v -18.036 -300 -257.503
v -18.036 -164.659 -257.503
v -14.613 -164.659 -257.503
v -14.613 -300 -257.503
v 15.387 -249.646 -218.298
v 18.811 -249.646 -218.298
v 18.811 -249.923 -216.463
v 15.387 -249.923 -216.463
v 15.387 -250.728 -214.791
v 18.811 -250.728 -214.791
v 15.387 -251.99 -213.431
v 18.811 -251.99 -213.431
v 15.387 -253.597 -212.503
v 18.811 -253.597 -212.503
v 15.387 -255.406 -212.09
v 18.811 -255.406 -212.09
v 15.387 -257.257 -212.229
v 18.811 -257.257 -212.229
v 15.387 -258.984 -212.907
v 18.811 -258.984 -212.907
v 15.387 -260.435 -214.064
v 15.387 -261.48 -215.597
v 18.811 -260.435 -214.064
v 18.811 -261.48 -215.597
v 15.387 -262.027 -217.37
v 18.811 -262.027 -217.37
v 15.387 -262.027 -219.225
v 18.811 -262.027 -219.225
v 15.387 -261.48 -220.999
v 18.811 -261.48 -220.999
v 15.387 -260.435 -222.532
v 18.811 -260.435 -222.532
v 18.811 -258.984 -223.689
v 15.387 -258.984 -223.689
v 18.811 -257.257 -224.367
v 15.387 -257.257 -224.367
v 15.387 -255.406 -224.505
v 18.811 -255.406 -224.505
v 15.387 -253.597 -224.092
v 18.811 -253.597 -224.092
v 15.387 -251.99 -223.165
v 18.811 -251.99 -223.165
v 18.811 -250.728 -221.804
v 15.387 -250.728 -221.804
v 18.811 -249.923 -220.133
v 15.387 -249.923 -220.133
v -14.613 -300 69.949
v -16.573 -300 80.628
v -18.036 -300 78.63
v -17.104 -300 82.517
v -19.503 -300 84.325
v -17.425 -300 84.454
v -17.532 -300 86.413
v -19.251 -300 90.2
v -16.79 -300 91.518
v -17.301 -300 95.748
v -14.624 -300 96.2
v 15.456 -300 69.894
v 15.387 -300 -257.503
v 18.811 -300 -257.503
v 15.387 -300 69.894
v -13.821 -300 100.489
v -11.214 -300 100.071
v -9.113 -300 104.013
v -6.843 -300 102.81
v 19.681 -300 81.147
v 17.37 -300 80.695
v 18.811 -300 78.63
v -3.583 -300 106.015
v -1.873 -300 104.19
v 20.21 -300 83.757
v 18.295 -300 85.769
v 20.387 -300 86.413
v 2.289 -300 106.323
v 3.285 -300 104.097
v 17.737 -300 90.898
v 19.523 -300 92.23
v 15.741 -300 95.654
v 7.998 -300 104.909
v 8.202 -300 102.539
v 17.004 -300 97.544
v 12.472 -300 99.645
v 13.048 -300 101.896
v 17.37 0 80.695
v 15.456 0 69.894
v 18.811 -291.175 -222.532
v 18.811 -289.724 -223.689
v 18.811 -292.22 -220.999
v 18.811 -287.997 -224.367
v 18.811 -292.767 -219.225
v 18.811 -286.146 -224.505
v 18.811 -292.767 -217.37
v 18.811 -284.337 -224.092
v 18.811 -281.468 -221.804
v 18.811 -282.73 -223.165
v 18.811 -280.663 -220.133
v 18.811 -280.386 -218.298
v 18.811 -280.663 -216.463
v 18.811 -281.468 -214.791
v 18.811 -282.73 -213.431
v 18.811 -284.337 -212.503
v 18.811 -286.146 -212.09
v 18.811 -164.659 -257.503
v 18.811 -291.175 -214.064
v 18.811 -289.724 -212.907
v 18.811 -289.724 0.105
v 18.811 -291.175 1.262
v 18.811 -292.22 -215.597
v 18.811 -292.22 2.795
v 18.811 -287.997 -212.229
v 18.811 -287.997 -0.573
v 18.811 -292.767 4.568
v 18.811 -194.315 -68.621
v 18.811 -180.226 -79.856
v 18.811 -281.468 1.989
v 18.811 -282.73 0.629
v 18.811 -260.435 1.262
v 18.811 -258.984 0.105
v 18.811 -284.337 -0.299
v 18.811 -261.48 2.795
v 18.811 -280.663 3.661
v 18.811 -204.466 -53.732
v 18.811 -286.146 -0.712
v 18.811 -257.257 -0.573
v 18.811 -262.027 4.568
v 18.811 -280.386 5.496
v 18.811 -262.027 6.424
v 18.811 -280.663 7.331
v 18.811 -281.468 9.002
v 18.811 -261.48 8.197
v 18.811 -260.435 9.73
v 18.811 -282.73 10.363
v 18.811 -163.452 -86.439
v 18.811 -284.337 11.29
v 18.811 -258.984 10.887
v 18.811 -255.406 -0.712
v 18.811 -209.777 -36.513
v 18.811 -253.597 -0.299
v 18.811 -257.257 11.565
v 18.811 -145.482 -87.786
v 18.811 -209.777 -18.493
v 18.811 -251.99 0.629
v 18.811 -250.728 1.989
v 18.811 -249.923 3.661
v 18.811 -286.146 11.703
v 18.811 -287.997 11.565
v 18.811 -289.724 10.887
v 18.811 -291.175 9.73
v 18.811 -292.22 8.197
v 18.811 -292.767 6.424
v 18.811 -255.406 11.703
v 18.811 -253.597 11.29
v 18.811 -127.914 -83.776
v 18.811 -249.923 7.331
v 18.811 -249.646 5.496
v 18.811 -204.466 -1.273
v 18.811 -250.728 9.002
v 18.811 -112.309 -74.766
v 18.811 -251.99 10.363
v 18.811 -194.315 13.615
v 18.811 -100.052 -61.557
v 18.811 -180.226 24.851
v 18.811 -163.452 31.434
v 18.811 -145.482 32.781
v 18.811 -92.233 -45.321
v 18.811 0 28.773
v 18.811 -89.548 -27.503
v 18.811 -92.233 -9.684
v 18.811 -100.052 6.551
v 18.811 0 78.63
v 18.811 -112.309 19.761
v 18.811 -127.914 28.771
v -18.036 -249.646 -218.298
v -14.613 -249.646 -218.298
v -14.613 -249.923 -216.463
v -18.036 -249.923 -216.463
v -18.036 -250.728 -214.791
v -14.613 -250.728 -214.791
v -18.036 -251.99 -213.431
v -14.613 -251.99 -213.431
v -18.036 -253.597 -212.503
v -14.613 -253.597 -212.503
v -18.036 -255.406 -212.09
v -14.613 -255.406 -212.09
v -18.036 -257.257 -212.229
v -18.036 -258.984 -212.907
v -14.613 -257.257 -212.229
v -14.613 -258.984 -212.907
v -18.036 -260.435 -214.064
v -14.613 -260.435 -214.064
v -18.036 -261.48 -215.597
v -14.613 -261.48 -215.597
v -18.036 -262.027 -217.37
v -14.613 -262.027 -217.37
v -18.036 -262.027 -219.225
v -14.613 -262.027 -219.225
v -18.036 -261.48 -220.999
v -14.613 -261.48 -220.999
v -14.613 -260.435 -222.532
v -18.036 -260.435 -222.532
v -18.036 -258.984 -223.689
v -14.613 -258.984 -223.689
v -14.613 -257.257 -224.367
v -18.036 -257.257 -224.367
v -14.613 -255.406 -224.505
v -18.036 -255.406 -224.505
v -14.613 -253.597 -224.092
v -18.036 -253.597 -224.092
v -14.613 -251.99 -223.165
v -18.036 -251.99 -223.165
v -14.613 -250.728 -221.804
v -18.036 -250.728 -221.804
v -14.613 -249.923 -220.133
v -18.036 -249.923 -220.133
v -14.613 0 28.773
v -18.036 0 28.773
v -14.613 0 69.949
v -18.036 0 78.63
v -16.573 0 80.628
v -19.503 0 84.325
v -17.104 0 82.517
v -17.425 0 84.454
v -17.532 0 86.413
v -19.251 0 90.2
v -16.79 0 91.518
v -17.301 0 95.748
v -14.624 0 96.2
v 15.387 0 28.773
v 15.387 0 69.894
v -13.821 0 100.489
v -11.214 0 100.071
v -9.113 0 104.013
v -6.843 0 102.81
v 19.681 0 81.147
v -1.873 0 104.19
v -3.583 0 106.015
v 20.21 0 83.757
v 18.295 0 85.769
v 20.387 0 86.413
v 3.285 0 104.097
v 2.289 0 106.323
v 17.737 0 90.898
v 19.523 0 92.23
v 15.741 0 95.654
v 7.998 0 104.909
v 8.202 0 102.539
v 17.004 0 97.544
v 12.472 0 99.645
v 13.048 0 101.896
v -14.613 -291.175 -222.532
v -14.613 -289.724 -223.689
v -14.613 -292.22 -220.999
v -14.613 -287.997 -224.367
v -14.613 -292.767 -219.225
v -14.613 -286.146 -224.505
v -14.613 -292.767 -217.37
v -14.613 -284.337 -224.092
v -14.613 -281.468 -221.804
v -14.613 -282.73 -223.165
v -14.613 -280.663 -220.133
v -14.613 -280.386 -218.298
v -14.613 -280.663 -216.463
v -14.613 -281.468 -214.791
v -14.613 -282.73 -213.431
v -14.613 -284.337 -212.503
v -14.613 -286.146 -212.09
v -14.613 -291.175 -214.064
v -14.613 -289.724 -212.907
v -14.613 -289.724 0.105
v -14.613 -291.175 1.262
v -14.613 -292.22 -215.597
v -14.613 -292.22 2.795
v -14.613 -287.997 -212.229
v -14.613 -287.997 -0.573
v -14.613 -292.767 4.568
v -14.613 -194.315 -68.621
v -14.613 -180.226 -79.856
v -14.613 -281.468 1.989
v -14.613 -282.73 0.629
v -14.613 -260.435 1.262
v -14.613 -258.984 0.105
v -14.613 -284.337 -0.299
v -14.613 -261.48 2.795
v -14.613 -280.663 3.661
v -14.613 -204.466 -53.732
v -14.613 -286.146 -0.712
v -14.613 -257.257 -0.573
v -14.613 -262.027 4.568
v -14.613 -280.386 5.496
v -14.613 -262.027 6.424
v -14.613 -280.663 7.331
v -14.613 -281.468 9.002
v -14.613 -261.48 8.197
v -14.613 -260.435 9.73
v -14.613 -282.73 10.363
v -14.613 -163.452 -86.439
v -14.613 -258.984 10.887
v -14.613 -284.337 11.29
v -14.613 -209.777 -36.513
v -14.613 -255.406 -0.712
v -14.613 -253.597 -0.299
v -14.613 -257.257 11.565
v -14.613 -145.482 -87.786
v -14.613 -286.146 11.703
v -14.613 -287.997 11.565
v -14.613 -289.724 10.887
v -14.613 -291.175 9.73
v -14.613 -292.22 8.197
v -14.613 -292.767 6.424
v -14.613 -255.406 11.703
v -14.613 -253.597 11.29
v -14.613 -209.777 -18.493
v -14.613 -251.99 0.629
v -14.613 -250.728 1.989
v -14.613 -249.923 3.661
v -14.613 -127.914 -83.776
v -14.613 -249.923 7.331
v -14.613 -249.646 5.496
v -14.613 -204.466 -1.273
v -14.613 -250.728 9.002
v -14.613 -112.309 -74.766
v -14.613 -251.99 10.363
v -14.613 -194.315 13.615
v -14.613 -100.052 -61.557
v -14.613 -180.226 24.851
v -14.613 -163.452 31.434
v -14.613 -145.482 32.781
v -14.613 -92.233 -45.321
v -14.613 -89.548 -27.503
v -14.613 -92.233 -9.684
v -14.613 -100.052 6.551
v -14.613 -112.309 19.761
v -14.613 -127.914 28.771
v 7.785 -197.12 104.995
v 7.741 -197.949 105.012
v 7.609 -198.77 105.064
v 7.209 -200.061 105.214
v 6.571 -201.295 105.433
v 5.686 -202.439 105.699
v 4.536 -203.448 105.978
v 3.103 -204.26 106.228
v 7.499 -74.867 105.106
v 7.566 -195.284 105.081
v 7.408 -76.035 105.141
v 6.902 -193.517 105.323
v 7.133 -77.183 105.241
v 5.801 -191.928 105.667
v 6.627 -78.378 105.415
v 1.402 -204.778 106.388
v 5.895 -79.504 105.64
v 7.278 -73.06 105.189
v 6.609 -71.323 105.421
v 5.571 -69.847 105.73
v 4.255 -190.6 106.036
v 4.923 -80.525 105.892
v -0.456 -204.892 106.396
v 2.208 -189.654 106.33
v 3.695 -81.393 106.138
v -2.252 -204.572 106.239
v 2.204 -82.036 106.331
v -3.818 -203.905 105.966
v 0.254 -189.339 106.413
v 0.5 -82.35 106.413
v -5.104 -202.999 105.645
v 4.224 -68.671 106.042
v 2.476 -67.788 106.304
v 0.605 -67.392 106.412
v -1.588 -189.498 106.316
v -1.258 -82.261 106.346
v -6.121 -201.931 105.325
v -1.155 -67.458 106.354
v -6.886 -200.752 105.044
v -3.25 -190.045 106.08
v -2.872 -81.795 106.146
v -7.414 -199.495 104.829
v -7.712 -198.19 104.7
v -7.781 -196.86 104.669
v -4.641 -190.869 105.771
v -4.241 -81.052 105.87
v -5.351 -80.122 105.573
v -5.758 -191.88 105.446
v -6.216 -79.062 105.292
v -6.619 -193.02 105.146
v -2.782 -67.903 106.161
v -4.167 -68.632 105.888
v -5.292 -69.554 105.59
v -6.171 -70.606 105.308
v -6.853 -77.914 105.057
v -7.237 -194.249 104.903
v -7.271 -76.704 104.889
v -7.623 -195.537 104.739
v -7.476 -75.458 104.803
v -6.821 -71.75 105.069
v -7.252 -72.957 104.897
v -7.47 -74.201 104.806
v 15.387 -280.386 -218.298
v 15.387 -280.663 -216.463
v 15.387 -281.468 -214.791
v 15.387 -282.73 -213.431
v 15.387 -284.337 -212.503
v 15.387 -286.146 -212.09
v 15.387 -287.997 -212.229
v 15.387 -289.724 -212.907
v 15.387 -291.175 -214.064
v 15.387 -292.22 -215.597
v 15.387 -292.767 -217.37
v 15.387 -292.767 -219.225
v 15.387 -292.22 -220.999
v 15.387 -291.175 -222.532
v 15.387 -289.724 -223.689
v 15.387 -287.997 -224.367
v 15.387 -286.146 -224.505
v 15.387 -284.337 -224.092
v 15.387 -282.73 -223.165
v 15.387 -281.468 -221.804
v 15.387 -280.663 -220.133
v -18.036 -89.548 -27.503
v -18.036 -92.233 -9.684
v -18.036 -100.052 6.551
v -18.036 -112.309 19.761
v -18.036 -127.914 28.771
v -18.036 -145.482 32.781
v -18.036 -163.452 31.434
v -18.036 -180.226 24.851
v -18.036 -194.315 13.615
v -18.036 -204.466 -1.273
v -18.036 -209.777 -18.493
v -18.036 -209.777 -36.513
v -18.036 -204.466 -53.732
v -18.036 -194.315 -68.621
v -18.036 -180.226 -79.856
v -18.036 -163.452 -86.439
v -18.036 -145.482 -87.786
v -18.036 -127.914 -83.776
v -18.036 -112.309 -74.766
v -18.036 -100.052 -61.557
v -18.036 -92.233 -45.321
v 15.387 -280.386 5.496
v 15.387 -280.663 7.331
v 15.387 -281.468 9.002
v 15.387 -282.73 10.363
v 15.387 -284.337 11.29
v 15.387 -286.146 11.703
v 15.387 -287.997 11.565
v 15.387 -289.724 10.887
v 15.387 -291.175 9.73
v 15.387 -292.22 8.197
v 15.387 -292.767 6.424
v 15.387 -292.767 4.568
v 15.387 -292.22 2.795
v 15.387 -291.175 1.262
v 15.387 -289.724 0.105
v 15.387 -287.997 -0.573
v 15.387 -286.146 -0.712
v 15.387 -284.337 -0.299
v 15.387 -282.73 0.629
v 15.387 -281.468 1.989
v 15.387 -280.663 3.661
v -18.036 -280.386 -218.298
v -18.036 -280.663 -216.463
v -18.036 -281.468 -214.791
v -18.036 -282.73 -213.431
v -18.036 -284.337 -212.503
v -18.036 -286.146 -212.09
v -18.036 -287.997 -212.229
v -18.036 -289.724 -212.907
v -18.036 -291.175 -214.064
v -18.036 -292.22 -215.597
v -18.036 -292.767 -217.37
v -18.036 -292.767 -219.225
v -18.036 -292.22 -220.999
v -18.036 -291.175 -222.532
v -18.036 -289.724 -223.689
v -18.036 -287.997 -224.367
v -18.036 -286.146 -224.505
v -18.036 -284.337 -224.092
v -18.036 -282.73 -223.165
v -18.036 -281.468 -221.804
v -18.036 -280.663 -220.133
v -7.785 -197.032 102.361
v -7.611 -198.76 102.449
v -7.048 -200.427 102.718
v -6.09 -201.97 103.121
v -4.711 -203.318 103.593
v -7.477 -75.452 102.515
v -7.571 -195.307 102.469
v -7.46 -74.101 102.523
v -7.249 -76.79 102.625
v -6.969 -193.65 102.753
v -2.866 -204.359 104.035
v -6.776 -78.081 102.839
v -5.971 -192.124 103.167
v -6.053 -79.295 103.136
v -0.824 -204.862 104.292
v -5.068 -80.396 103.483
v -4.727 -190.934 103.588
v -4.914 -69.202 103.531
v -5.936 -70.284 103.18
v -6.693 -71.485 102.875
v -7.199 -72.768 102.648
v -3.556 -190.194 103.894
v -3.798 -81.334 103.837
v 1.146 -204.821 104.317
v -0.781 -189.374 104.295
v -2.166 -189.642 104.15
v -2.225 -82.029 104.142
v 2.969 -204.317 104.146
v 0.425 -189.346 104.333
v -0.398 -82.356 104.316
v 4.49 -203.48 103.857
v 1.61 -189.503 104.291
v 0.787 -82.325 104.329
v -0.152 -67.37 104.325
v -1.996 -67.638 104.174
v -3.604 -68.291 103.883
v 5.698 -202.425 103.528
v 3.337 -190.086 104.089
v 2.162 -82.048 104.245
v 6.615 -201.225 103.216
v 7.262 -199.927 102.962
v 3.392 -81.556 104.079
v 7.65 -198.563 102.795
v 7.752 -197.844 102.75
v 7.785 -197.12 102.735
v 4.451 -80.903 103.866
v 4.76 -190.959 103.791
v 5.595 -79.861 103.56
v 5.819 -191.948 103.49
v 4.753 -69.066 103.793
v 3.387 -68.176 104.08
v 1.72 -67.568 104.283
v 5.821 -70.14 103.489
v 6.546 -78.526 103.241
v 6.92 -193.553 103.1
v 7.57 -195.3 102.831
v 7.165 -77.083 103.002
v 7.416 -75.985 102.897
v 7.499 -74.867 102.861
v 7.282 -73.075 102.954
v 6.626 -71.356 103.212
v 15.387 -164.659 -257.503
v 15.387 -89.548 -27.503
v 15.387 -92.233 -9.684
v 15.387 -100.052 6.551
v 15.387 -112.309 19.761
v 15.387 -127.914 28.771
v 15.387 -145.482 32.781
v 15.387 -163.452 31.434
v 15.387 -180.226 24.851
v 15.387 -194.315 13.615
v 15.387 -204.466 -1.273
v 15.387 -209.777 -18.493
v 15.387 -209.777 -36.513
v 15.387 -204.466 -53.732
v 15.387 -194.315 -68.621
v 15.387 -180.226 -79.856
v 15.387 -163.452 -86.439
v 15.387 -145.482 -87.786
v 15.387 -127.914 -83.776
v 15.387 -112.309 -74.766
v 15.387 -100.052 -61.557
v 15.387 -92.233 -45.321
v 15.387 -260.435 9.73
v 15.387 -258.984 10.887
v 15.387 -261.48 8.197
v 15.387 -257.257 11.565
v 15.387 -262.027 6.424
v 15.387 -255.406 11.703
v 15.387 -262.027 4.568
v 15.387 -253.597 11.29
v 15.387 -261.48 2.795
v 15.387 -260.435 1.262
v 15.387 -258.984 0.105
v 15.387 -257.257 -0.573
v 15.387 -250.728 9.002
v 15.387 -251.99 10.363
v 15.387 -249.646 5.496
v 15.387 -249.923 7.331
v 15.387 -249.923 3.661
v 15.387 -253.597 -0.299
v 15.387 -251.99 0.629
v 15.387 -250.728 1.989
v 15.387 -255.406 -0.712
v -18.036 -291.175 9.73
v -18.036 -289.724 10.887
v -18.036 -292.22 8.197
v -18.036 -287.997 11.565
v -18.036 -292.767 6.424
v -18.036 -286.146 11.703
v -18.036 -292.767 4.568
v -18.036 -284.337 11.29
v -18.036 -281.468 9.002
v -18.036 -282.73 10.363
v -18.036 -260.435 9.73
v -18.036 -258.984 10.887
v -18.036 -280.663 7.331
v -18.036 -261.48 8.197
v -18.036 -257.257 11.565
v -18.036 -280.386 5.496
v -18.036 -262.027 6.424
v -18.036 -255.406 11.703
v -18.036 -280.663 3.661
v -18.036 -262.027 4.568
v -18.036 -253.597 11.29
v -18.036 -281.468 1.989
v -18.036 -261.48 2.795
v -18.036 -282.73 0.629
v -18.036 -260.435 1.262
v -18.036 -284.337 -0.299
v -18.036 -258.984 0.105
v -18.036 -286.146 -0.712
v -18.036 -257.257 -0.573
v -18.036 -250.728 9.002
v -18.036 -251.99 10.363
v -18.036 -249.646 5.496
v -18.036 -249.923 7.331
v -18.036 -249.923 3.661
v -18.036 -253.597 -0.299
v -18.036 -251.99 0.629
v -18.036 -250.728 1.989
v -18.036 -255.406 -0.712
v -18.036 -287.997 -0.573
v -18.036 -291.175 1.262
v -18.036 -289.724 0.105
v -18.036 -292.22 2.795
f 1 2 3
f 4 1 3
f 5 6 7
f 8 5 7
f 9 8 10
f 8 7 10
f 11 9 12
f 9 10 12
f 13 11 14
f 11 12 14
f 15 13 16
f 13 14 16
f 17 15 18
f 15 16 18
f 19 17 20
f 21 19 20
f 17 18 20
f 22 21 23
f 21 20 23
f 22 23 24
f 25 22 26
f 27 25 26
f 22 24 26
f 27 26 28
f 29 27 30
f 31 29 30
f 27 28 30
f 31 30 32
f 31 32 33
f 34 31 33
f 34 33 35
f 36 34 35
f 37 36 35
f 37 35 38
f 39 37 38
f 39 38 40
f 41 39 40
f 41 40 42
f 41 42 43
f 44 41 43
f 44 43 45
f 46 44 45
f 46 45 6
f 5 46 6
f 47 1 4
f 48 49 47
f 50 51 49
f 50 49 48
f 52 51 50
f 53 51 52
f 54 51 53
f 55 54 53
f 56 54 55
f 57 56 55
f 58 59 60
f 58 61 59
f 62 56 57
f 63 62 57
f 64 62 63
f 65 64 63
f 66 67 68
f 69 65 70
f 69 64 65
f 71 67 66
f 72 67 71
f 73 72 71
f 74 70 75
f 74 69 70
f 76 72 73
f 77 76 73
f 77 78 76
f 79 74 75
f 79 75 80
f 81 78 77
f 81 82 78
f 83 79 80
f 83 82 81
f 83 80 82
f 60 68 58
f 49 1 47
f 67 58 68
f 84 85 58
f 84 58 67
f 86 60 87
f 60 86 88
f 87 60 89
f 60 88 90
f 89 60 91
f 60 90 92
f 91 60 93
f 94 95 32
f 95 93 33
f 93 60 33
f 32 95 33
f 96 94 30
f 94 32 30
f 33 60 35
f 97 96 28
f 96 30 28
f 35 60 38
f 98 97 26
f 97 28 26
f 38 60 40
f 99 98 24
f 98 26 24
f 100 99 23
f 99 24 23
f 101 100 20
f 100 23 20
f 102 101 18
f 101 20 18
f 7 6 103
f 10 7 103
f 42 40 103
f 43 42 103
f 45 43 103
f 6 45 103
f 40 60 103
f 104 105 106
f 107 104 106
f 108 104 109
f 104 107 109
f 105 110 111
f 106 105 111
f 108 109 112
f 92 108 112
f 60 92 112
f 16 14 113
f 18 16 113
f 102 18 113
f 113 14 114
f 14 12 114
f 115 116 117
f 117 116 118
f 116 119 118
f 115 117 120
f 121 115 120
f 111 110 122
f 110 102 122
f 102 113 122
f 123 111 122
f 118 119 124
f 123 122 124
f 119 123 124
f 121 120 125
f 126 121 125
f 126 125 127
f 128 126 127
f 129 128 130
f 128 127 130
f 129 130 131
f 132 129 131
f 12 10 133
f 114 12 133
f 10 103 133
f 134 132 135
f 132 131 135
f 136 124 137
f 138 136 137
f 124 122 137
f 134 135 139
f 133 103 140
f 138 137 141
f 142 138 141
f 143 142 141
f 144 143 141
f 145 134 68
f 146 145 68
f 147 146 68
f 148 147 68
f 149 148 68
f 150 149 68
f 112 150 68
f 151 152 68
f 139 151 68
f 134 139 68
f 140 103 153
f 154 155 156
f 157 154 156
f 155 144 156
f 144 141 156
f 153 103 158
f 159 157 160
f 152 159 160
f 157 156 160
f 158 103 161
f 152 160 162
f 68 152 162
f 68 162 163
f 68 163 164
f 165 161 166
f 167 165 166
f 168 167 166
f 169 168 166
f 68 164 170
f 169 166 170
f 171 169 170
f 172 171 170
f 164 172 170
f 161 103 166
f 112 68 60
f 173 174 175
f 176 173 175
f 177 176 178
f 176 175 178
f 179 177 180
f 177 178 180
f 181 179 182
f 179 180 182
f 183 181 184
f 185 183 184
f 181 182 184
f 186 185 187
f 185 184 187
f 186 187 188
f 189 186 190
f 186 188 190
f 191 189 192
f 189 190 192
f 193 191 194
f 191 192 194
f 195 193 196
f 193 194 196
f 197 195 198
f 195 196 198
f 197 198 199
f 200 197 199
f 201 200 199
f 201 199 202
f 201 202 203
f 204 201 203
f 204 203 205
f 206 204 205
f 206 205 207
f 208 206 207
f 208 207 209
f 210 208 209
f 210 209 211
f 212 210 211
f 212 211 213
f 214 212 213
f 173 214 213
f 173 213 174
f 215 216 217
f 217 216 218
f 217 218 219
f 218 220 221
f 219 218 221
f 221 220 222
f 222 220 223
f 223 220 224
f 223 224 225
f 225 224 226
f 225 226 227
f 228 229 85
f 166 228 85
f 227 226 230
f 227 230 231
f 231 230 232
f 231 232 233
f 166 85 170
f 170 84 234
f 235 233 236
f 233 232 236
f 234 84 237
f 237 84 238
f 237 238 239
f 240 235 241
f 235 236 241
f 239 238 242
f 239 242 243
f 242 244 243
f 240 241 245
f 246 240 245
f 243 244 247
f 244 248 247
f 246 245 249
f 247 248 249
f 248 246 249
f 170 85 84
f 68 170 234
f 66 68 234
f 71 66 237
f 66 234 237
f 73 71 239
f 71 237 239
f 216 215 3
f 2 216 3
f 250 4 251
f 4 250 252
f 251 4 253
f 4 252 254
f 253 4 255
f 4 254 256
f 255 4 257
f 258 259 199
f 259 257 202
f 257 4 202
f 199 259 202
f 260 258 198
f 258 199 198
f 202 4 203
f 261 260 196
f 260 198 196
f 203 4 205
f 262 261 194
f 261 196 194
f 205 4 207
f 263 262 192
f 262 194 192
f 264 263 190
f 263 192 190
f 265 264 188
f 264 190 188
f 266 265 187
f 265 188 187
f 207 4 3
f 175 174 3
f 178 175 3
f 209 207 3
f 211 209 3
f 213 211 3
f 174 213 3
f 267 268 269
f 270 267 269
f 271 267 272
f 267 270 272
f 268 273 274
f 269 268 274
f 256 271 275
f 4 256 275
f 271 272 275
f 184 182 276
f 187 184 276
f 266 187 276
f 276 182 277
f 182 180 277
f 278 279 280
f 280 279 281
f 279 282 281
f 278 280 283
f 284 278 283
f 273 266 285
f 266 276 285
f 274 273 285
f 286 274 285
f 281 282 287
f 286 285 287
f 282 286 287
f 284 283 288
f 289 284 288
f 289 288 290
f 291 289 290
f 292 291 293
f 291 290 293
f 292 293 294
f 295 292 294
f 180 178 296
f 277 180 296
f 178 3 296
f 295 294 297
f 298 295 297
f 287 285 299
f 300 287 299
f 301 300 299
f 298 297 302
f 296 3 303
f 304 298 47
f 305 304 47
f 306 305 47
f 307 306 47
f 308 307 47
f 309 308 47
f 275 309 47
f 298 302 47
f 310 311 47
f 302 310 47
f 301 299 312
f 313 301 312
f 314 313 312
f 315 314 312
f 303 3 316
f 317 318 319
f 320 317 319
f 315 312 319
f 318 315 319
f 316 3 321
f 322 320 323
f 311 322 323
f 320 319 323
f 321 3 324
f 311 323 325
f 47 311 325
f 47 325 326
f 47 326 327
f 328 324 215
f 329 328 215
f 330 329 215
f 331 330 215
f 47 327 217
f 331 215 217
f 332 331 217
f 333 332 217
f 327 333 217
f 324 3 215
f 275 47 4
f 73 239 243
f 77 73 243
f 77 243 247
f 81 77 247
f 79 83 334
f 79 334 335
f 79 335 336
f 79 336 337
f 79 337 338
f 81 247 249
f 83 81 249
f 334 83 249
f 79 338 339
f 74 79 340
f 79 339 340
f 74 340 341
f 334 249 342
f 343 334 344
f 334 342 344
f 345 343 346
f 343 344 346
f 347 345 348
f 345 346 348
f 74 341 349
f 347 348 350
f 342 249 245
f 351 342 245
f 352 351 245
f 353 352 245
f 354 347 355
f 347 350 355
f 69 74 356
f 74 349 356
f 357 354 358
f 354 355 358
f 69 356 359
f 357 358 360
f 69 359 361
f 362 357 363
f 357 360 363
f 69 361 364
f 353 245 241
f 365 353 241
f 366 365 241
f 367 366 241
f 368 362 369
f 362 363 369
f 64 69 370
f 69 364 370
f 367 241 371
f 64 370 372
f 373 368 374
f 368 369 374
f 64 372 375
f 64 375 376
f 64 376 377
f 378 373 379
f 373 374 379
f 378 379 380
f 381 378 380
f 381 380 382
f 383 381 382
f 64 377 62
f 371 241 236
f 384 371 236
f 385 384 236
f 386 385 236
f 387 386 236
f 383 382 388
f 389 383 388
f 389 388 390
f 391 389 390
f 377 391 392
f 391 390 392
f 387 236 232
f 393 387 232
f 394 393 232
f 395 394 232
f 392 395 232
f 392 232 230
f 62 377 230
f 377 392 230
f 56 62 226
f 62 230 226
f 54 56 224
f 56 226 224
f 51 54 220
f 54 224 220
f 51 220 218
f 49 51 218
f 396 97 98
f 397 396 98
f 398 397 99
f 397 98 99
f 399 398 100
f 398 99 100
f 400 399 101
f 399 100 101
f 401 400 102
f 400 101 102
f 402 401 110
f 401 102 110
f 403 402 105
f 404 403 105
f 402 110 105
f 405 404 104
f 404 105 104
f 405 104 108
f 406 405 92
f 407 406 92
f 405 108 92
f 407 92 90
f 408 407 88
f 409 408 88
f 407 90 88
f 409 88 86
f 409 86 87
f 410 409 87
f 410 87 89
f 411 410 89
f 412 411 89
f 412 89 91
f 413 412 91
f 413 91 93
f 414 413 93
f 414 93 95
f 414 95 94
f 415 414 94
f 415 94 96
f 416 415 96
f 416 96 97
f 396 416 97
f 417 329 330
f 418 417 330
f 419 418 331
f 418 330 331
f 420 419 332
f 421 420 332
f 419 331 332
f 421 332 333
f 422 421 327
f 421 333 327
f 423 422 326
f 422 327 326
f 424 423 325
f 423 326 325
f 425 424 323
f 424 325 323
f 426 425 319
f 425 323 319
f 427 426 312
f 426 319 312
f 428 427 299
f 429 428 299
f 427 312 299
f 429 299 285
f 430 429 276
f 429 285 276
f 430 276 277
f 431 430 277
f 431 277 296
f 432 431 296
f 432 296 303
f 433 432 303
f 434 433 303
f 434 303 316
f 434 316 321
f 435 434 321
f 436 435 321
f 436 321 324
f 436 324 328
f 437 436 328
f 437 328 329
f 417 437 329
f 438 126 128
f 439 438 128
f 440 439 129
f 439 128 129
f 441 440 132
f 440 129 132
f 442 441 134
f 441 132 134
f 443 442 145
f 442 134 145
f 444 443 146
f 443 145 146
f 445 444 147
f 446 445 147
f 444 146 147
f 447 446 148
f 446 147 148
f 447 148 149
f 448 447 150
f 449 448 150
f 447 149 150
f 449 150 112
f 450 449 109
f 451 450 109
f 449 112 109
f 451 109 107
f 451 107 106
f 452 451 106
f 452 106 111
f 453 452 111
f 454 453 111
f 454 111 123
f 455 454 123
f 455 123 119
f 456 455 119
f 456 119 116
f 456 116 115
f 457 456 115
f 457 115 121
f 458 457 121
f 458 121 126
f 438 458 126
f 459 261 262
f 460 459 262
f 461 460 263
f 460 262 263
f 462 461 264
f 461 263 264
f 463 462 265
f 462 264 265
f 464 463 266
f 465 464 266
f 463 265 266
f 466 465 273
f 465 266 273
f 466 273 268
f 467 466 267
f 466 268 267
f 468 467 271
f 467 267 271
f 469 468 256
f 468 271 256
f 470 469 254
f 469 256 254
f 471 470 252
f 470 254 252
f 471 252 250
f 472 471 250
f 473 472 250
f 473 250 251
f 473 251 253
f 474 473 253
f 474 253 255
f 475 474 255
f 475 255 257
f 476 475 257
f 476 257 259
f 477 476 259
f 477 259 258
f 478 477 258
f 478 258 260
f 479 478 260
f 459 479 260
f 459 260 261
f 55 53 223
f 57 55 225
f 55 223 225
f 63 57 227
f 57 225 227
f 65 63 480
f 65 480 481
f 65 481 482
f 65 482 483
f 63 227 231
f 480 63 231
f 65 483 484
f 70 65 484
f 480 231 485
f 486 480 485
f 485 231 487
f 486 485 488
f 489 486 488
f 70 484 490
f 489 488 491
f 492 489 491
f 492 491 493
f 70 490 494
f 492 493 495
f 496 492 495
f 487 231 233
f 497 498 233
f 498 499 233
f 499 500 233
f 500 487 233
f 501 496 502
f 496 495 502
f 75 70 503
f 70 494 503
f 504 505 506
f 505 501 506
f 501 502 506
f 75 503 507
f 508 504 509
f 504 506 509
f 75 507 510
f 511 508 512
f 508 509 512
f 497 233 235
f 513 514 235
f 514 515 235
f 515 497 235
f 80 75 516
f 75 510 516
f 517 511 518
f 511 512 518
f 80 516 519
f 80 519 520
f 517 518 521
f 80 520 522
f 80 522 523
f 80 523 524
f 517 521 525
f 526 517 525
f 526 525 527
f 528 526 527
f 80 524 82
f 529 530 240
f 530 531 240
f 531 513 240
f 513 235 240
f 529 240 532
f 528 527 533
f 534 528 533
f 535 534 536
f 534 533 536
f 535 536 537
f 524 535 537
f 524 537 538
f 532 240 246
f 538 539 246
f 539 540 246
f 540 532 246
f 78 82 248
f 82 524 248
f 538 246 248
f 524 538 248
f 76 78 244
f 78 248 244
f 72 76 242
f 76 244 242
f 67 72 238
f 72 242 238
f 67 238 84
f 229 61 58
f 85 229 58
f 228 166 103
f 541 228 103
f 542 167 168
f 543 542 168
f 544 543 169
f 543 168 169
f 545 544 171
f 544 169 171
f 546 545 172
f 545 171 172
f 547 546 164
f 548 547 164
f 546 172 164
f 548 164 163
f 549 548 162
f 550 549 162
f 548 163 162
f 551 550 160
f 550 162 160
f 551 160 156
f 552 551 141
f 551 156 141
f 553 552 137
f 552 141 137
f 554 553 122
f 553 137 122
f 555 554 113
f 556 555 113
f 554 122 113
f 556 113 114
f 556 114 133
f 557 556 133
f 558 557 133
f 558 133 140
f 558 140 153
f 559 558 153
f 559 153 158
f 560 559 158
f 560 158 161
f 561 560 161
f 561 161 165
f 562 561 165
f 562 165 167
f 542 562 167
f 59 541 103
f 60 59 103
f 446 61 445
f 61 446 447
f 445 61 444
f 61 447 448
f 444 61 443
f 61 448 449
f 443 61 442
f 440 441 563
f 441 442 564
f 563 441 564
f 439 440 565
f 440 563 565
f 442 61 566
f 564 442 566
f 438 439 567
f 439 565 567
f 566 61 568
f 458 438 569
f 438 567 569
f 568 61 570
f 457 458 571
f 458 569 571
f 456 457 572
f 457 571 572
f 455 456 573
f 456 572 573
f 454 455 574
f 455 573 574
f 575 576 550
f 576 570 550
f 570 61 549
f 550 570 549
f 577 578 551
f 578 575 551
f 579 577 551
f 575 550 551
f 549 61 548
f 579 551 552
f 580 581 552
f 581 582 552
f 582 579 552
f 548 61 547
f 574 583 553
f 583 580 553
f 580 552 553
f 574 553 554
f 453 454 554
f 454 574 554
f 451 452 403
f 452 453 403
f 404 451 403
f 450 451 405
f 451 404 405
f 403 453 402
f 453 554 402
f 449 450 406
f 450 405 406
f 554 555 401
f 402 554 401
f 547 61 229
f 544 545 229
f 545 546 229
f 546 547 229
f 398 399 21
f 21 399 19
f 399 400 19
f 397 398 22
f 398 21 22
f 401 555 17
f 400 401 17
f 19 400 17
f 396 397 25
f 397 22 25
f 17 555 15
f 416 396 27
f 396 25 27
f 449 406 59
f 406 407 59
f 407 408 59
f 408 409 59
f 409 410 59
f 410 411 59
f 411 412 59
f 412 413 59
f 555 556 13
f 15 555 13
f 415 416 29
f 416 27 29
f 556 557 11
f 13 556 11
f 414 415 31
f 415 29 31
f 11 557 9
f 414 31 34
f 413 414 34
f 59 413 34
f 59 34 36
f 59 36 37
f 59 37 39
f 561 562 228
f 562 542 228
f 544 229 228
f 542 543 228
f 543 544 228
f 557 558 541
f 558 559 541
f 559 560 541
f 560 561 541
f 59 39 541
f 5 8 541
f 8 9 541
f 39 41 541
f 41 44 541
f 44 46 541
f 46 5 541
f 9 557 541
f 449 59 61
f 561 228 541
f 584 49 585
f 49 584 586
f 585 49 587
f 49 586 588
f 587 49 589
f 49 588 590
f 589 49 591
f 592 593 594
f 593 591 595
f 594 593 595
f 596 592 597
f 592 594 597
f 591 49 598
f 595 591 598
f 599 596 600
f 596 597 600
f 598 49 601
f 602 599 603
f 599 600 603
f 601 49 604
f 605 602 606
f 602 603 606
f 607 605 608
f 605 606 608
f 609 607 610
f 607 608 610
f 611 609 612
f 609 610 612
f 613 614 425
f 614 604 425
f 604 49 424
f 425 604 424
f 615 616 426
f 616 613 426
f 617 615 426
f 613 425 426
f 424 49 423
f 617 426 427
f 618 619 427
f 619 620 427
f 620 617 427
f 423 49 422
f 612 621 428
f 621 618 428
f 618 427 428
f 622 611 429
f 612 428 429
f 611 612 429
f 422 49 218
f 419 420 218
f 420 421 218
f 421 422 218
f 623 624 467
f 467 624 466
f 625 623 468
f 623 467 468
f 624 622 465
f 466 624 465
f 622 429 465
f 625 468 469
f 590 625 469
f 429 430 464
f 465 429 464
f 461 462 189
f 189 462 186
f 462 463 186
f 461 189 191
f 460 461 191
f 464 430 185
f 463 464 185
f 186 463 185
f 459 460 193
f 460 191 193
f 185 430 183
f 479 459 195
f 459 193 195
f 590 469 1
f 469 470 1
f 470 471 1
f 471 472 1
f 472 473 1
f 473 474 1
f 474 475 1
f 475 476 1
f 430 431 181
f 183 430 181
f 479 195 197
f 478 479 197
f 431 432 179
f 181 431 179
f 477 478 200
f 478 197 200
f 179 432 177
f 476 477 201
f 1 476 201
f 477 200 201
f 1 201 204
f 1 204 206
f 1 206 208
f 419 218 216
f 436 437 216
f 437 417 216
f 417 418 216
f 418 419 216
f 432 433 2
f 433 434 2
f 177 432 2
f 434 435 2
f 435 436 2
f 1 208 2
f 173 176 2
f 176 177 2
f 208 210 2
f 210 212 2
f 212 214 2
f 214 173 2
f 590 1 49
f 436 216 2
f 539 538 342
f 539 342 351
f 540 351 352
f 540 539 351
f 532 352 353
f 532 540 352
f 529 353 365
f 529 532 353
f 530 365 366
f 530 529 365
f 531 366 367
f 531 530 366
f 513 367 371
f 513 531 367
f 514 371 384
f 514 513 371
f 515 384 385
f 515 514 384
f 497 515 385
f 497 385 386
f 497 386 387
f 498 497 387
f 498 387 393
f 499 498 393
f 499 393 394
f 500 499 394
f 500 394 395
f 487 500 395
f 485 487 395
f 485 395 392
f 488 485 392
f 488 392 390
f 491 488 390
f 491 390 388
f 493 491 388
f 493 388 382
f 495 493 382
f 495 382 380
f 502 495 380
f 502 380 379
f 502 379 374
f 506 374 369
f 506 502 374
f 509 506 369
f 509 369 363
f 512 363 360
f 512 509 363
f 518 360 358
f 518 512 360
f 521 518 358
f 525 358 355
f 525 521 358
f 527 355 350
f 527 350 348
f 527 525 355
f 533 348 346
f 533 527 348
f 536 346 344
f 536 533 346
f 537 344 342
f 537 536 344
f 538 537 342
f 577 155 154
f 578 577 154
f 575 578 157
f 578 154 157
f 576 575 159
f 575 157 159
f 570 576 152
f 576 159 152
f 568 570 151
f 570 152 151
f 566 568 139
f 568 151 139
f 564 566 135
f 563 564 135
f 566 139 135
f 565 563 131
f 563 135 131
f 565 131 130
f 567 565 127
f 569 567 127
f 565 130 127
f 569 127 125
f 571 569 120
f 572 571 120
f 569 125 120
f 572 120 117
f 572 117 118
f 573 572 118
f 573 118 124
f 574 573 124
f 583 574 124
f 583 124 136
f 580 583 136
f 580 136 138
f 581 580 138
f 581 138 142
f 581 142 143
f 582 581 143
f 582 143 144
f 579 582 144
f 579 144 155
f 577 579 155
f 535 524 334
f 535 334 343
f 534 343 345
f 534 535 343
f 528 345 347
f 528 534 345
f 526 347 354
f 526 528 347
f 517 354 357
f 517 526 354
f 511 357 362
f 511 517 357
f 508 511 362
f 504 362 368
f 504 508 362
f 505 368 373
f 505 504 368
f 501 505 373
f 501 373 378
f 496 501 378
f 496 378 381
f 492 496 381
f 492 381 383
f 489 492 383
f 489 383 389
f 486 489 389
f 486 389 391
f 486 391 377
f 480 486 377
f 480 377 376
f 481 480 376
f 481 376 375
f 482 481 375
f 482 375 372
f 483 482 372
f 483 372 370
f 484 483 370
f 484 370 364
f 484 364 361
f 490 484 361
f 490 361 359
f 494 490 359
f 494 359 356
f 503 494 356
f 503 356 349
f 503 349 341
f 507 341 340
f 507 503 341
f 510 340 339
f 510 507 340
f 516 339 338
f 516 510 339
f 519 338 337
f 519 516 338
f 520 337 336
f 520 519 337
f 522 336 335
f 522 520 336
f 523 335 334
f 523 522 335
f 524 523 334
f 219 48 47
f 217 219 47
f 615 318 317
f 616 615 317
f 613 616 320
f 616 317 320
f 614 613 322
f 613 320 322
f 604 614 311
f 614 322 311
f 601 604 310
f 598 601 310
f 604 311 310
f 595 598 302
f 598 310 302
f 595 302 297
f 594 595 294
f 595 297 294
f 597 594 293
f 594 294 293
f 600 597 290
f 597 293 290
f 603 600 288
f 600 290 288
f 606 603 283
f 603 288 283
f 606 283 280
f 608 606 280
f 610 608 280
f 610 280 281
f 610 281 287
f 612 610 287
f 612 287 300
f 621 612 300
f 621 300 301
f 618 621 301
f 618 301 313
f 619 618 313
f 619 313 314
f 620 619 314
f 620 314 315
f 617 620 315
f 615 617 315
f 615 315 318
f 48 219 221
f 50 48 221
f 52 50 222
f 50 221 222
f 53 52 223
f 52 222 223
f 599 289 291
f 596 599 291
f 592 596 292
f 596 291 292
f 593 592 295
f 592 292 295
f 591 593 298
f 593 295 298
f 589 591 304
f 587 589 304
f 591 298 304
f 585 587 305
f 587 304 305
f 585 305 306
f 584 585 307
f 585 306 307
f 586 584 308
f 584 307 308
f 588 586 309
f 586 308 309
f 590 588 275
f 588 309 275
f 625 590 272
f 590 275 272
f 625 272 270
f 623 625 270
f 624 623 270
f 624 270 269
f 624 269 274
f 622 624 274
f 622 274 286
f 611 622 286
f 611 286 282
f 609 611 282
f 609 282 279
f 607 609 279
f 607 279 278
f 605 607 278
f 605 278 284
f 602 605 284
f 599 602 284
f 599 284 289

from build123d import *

# Parameters (mm, degrees)
F1_DEPTH  = 300
F3_DEPTH  = 300
F4_R      = 6.225
F5_DEPTH  = 200
F6_R      = 7.4994450041
F6_R_2    = 7.7853905485
F7_DEPTH  = 106.4144483809
F9_DEPTH  = 1000
F10_R     = 60.4522878615
F11_DEPTH = 500


with BuildPart() as f1:
    # F0 (on Front) → F1 (new body)
    with BuildSketch(Plane.XZ):
        with BuildLine():
            Line((-18.0362154643, 86.4134483809), (18.8106045383, 86.4134483809))
            Line((18.8106045383, 86.4134483809), (18.8106045383, 78.6302636906))
            ThreePointArc((18.8106045383, 78.6302636906), (19.9890847523, 82.4428187096), (20.387194537, 86.4134483809))
            ThreePointArc((20.387194537, 86.4134483809), (-3.5834351343, 106.0153385962), (-18.0362154643, 78.6302636906))
            Line((-18.0362154643, 78.6302636906), (-18.0362154643, 86.4134483809))
        make_face()
        with BuildLine():
            Line((18.8106045383, 78.6302636906), (18.8106045383, 86.4134483809))
            Line((18.8106045383, 86.4134483809), (-18.0362154643, 86.4134483809))
            Line((-18.0362154643, 86.4134483809), (-18.0362154643, 78.6302636906))
            ThreePointArc((-18.0362154643, 78.6302636906), (0.387194537, 66.4134483809), (18.8106045383, 78.6302636906))
        make_face()
        with BuildLine():
            Line((18.8106045383, -257.5025590471), (18.8106045383, 78.6302636906))
            ThreePointArc((18.8106045383, 78.6302636906), (0.387194537, 66.4134483809), (-18.0362154643, 78.6302636906))
            Line((-18.0362154643, 78.6302636906), (-18.0362154643, -257.5025590471))
            Line((-18.0362154643, -257.5025590471), (18.8106045383, -257.5025590471))
        make_face()
    extrude(amount=F1_DEPTH)

    # F2 (on face) → F3 (cut)
    with BuildSketch(Plane(origin=(0, 0, 0), x_dir=(-1, 0, 0), z_dir=(0, 1, 0))):
        with BuildLine():
            Line((175.8913316219, 44.6973187515), (175.9091161187, 44.6973187515))
            ThreePointArc((175.9091161187, 44.6973187515), (159.7223112701, 60.9808530469), (143.5343522574, 44.6984661409))
            Line((143.5343522574, 44.6984661409), (143.5521367467, 44.6984661409))
            ThreePointArc((143.5521367467, 44.6984661409), (159.6743751329, 60.9629995089), (175.8916158384, 44.7931905997))
            ThreePointArc((175.8916158384, 44.7931905997), (175.8915447841, 44.7452544649), (175.8913316219, 44.6973187515))
        make_face()
        with BuildLine():
            ThreePointArc((174.2740117009, 37.7436316879), (175.4712371526, 41.1301009041), (175.8913316219, 44.6973187515))
            ThreePointArc((175.8913316219, 44.6973187515), (175.8915447841, 44.7452544649), (175.8916158384, 44.7931905997))
            ThreePointArc((175.8916158384, 44.7931905997), (159.6743751329, 60.9629995089), (143.5521367467, 44.6984661409))
            ThreePointArc((143.5521367467, 44.6984661409), (156.1515321138, 29.0223758967), (174.2740117009, 37.7436316879))
        make_face()
        with BuildLine():
            ThreePointArc((14.612805463, 76.6096711506), (16.7870431212, 81.2988018789), (17.5324608163, 86.4134483809))
            ThreePointArc((17.5324608163, 86.4134483809), (-5.501841039, 103.5876860391), (-15.387194537, 76.6096711506))
            Line((-15.387194537, 76.6096711506), (-15.387194537, 86.4134483809))
            Line((-15.387194537, 86.4134483809), (-0.387194537, 86.4134483809))
            Line((-0.387194537, 86.4134483809), (14.612805463, 86.4134483809))
            Line((14.612805463, 86.4134483809), (14.612805463, 76.6096711506))
        make_face()
        with BuildLine():
            Line((-15.387194537, 86.4134483809), (-15.387194537, 76.6096711506))
            ThreePointArc((-15.387194537, 76.6096711506), (-8.9146132219, 70.6528272461), (-0.387194537, 68.4937930276))
            Line((-0.387194537, 68.4937930276), (-0.387194537, 86.4134483809))
            Line((-0.387194537, 86.4134483809), (-15.387194537, 86.4134483809))
        make_face()
        with BuildLine():
            ThreePointArc((-0.387194537, 68.4937930276), (-8.9146132219, 70.6528272461), (-15.387194537, 76.6096711506))
            Line((-15.387194537, 76.6096711506), (-15.387194537, -287.4657809734))
            Line((-15.387194537, -287.4657809734), (-0.387194537, -287.4657809734))
            Line((-0.387194537, -287.4657809734), (-0.387194537, 68.4937930276))
        make_face()
        with BuildLine():
            Line((14.612805463, -287.4657809734), (14.612805463, 76.6096711506))
            ThreePointArc((14.612805463, 76.6096711506), (8.1402241479, 70.6528272461), (-0.387194537, 68.4937930276))
            Line((-0.387194537, 68.4937930276), (-0.387194537, -287.4657809734))
            Line((-0.387194537, -287.4657809734), (14.612805463, -287.4657809734))
        make_face()
        with BuildLine():
            ThreePointArc((-0.387194537, 68.4937930276), (8.1402241479, 70.6528272461), (14.612805463, 76.6096711506))
            Line((14.612805463, 76.6096711506), (14.612805463, 86.4134483809))
            Line((14.612805463, 86.4134483809), (-0.387194537, 86.4134483809))
            Line((-0.387194537, 86.4134483809), (-0.387194537, 68.4937930276))
        make_face()
    extrude(amount=-F3_DEPTH, mode=Mode.SUBTRACT)

    # F4 (on face) → F5 (cut)
    with BuildSketch(Plane.YZ.offset(18.8106045383)):
        with Locations((-286.6114377975, 5.4957243272)):
            Circle(F4_R)
        with Locations((-255.8714377975, 5.4957243272)):
            Circle(F4_R)
        with Locations((-255.8714377975, -218.297693353)):
            Circle(F4_R)
        with Locations((-286.6114377975, -218.297693353)):
            Circle(F4_R)
    extrude(amount=-F5_DEPTH, mode=Mode.SUBTRACT)

    # F6 (on Top) → F7 (cut, through all)
    with BuildSketch(Plane.XY):
        with Locations((0, -74.8674422503)):
            Circle(F6_R)
        with Locations((0, -197.1199959517)):
            Circle(F6_R_2)
    extrude(amount=F7_DEPTH, mode=Mode.SUBTRACT)

    # F8 (on Front) → F9 (cut)
    with BuildSketch(Plane.XZ):
        Polygon((15.4558392242, 69.8942989111), (17.4741577357, 81.283390522), (-16.6930966079, 81.283390522), (-14.6026955917, 69.8942989111), align=None)
    extrude(amount=F9_DEPTH, mode=Mode.SUBTRACT)

    # F10 (on face) → F11 (cut)
    with BuildSketch(Plane.YZ.offset(18.8106045383)):
        Polygon((0, 28.7725478411), (-164.6585613489, -257.5025590471), (0, -257.5025590471), align=None)
        with Locations((-150, -27.5025590471)):
            Circle(F10_R)
    extrude(amount=-F11_DEPTH, mode=Mode.SUBTRACT)


solid = f1.part
